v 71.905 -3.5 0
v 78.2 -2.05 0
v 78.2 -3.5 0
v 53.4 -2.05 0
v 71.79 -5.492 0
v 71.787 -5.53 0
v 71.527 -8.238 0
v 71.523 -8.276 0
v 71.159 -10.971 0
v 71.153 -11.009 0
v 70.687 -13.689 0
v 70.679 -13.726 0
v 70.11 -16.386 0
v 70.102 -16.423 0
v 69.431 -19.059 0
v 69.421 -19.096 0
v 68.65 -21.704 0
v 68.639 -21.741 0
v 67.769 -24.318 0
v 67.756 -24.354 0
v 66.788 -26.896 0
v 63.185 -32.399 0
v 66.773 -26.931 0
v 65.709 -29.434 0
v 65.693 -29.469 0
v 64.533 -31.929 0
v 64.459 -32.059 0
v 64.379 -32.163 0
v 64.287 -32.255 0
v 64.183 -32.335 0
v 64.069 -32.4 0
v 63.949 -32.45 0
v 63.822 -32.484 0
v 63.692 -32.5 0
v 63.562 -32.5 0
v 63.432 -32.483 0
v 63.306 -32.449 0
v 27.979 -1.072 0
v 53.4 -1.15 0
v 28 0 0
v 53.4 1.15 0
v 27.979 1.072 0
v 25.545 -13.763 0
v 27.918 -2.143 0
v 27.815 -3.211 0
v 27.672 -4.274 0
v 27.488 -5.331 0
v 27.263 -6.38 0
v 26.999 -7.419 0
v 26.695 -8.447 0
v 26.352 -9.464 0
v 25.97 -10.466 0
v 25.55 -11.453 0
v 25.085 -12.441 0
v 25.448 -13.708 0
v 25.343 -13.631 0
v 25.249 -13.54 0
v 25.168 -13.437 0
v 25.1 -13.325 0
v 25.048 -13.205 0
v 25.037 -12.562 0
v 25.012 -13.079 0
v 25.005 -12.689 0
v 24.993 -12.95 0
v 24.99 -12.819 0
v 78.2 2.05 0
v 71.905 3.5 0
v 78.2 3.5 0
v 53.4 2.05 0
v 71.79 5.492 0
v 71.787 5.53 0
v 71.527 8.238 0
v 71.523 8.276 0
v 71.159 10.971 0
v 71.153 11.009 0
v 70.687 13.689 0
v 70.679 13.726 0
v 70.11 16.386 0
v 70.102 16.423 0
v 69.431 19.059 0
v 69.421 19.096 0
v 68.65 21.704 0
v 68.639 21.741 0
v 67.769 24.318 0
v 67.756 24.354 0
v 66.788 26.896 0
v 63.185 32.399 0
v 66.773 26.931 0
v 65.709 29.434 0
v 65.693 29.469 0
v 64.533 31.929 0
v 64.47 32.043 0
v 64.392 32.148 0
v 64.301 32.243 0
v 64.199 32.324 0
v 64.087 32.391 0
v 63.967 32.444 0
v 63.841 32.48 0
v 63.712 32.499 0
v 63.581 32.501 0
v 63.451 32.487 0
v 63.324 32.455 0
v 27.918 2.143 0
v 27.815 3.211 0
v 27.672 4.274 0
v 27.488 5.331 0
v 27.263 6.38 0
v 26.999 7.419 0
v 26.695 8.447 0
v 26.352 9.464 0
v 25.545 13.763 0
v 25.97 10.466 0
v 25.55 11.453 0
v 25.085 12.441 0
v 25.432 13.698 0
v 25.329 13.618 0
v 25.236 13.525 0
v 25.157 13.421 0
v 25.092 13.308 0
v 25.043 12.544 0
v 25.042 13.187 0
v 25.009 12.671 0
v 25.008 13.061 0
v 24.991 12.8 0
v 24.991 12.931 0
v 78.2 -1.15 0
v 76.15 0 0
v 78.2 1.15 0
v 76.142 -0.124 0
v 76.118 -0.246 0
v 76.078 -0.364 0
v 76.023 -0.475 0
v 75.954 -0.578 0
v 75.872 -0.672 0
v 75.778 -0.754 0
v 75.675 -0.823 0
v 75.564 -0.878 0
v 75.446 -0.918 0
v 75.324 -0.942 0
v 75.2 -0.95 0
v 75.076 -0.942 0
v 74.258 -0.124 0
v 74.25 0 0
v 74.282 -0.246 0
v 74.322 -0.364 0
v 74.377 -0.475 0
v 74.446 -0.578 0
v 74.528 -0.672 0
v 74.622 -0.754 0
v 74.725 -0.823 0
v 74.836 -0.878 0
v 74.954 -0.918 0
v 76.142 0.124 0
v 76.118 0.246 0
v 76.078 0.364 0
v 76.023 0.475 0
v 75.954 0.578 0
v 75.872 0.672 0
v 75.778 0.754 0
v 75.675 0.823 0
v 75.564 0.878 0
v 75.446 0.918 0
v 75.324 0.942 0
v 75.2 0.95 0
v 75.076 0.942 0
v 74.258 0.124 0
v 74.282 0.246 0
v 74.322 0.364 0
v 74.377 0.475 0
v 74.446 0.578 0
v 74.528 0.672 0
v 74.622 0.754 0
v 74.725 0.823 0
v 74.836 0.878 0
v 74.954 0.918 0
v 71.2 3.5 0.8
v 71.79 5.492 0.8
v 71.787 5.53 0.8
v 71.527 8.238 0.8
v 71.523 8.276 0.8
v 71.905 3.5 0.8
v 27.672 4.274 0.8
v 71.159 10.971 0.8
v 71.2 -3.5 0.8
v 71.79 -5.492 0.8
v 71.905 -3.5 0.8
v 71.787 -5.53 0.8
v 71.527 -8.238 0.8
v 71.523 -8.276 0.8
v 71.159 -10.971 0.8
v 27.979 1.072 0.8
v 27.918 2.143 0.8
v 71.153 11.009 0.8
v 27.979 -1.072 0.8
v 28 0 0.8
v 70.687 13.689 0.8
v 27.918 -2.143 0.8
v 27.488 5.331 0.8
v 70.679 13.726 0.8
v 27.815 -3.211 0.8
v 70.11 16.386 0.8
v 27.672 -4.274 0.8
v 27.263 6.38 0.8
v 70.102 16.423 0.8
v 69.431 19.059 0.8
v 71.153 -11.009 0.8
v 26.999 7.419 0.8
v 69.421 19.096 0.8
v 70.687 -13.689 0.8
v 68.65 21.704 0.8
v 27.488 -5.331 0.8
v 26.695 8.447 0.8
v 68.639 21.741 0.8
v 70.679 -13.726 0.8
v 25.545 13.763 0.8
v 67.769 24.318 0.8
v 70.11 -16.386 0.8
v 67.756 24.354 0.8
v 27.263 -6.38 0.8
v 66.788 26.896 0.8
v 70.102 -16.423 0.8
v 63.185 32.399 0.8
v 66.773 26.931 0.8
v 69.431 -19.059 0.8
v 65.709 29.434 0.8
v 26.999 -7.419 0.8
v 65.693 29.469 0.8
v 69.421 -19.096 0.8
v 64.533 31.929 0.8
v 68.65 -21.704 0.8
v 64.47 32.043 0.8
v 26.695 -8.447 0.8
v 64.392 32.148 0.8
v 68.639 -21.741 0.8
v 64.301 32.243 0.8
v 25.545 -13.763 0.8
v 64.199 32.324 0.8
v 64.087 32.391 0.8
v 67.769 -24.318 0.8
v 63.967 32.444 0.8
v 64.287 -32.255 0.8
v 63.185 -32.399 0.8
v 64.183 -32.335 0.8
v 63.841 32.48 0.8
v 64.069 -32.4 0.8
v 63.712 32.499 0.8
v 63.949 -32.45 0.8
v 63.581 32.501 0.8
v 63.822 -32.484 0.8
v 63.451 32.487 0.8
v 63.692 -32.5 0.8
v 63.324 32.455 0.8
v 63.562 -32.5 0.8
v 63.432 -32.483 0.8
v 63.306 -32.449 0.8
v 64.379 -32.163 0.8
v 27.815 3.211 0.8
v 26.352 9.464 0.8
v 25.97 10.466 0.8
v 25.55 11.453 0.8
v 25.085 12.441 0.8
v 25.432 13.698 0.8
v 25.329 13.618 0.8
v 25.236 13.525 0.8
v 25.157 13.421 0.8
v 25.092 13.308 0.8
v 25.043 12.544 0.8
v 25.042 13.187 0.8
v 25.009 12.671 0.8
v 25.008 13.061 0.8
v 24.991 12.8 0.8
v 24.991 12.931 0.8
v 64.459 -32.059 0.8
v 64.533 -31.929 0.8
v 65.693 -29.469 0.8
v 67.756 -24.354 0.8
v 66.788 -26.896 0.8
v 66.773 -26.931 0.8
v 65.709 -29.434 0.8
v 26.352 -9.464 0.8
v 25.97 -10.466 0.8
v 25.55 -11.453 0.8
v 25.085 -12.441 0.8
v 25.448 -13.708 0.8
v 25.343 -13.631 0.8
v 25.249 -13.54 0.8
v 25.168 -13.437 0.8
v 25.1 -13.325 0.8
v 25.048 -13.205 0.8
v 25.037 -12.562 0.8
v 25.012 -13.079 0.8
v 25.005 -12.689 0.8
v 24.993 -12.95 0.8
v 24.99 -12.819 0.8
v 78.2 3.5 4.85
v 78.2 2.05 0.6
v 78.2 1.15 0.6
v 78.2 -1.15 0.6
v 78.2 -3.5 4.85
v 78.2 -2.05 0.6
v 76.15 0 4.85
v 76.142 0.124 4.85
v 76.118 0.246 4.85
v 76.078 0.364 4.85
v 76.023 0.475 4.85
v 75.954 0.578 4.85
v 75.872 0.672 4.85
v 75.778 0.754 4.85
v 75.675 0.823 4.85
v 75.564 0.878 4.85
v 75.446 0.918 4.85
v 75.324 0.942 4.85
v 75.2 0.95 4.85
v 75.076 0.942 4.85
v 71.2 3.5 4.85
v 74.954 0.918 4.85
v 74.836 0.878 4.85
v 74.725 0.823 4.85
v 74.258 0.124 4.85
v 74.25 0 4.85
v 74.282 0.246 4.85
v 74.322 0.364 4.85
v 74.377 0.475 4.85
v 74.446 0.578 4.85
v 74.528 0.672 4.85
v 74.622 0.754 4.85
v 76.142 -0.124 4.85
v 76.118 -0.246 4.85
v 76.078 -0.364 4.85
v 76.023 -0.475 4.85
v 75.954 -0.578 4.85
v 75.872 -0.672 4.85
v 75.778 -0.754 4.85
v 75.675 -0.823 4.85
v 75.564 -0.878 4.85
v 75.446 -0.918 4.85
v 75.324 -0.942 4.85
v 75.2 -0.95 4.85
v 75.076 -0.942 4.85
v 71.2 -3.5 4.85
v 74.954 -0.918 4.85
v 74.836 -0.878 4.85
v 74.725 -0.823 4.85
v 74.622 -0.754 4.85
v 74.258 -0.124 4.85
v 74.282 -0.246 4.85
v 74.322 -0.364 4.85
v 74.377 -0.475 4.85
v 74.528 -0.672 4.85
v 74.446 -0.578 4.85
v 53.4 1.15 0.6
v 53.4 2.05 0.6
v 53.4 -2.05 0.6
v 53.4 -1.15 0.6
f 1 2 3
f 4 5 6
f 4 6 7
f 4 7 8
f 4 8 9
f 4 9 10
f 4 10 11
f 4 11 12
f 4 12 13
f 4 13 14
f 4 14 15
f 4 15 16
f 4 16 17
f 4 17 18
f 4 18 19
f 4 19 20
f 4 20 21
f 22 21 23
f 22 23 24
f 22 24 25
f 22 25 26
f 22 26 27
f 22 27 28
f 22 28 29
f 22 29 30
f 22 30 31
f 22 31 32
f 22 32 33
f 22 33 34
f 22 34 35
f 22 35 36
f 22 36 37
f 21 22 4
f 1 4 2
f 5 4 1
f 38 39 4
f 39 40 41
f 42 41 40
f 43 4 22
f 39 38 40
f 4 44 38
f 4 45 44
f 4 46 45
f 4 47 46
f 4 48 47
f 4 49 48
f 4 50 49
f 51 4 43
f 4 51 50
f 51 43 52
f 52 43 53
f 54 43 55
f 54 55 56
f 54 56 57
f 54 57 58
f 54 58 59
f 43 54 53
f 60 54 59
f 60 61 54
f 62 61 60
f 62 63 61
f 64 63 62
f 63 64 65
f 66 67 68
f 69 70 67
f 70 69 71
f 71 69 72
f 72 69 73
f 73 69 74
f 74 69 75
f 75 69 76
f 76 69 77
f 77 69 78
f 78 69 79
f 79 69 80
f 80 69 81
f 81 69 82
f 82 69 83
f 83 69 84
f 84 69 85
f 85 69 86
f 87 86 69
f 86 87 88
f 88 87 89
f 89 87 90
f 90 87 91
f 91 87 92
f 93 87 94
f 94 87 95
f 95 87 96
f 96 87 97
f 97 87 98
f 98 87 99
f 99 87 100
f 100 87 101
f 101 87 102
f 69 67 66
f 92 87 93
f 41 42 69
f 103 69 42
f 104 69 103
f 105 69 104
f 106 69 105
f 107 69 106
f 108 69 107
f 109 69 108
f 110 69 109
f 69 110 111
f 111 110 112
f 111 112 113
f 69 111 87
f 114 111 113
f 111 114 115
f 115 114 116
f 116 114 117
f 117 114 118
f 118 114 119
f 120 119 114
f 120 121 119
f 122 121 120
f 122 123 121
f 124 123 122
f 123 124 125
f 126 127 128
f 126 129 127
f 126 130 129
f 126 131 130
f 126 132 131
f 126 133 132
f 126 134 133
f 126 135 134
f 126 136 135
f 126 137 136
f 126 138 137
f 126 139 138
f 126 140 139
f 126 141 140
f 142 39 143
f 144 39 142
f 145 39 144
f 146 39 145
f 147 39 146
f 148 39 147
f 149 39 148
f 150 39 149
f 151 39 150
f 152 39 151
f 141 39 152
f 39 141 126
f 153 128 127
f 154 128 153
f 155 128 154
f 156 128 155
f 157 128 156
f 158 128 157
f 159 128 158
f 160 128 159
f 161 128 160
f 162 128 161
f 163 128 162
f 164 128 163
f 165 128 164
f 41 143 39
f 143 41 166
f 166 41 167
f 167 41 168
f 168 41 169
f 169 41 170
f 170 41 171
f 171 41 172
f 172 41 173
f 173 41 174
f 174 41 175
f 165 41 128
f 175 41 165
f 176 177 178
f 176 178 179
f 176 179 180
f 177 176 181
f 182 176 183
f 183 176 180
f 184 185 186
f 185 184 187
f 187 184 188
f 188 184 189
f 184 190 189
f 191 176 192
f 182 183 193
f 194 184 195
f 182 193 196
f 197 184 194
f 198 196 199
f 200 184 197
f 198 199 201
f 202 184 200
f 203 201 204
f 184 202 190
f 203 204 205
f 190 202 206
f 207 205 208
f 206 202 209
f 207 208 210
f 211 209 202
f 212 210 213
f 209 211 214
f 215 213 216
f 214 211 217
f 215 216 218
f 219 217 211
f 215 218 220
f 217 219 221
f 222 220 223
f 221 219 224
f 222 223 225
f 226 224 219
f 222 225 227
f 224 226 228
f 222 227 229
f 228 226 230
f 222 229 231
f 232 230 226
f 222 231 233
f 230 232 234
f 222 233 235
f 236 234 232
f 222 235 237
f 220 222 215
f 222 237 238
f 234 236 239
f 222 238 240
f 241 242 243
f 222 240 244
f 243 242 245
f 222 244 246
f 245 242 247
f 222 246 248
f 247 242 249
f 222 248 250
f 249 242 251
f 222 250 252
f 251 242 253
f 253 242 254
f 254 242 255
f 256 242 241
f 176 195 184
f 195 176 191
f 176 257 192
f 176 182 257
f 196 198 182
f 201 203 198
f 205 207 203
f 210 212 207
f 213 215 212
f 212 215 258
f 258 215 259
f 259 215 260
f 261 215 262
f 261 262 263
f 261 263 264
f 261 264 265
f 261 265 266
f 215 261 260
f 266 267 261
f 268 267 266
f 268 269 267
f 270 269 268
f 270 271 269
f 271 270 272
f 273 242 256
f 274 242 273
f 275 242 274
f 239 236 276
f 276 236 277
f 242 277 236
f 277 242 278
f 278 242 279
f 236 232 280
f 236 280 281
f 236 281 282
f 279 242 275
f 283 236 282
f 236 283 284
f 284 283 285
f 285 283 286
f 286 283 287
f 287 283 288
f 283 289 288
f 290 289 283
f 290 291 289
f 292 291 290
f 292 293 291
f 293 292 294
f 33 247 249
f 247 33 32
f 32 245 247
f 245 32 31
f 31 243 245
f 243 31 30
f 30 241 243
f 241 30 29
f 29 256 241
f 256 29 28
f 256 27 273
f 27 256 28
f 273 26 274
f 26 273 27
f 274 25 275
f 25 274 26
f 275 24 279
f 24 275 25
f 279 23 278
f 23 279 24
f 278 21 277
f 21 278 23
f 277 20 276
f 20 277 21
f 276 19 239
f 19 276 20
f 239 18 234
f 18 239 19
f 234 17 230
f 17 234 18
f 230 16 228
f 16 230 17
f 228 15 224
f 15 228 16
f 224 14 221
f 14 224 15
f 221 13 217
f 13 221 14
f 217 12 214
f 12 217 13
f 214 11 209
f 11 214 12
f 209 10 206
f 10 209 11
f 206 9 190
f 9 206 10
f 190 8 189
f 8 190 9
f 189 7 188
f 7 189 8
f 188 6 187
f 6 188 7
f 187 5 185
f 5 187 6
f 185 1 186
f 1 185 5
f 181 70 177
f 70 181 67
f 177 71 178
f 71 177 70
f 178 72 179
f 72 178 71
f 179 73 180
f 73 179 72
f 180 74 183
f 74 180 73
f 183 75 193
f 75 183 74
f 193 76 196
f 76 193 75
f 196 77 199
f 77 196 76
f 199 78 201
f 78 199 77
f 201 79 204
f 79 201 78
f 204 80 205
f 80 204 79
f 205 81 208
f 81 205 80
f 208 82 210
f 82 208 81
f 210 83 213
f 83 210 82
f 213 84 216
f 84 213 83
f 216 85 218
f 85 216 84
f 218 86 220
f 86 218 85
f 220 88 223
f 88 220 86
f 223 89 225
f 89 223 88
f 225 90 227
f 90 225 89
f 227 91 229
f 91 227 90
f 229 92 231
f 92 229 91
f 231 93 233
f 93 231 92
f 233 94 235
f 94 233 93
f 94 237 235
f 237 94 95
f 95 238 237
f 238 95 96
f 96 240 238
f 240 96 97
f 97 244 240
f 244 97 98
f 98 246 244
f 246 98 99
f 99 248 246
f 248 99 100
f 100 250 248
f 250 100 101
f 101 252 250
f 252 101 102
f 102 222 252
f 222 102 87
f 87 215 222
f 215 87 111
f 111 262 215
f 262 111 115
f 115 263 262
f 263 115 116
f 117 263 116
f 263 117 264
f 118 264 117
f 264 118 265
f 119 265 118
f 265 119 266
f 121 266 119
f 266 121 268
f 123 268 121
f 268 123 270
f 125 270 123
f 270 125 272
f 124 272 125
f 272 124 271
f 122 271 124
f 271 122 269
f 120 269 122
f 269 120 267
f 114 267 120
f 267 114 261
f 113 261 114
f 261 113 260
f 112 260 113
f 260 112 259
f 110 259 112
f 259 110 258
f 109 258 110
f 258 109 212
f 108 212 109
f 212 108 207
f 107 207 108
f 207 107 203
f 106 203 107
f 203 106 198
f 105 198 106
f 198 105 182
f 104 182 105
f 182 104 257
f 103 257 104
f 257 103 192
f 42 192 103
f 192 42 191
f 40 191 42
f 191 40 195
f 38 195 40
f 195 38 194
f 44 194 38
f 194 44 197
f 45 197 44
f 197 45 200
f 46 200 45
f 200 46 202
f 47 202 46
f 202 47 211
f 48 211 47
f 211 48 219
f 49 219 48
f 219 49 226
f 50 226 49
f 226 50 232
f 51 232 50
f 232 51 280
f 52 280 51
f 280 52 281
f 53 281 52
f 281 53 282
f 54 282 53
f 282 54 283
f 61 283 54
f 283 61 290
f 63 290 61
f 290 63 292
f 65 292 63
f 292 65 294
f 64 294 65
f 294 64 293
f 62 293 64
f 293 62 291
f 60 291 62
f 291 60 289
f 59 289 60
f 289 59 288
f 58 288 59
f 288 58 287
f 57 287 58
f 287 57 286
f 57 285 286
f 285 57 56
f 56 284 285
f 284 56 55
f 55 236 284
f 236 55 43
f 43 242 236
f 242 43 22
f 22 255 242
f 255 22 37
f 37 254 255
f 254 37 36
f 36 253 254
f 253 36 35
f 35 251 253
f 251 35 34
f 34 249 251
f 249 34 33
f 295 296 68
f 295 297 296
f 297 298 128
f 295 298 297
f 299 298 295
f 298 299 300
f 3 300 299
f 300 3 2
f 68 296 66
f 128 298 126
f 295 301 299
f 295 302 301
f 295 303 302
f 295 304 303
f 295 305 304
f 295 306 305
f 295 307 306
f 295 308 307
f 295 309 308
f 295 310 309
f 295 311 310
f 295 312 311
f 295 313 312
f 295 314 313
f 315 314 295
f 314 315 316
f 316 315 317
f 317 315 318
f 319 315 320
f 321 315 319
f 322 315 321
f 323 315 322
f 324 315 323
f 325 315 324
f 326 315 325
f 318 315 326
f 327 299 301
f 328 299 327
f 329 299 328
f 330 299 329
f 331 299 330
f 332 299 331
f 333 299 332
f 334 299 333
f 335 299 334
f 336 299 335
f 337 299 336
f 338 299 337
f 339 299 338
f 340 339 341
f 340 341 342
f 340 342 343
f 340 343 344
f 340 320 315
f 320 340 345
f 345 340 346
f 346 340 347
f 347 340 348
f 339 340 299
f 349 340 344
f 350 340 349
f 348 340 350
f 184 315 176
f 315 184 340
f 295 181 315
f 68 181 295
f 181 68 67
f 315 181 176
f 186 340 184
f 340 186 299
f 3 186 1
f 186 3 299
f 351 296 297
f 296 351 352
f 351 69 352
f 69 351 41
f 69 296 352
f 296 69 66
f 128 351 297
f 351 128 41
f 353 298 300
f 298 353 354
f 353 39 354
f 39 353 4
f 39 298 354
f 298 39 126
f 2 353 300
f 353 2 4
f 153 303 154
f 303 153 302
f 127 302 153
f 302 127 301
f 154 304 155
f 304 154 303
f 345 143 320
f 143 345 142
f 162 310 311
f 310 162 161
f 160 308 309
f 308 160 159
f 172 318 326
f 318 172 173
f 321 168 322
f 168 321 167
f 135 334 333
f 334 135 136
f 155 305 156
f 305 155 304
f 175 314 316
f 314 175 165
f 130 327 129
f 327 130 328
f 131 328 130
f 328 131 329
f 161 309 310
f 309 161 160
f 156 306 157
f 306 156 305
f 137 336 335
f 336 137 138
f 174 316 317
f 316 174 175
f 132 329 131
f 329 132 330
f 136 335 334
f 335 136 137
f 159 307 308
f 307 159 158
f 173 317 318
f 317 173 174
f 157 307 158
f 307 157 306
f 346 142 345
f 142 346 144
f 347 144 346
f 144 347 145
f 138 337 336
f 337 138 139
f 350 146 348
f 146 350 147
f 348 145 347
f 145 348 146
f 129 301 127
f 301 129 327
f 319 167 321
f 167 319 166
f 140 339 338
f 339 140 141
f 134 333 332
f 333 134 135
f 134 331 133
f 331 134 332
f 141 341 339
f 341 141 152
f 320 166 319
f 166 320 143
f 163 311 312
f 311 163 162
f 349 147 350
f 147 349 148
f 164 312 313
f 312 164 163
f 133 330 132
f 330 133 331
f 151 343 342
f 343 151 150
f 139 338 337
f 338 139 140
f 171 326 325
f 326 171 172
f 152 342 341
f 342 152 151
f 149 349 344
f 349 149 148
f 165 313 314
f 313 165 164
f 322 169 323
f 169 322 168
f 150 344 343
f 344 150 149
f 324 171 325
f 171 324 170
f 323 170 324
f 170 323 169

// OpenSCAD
// file: parameters.scad
// =============================================================================
// Gen-BL — nightly 2026-10-06 (physics_scorer, honest magpylib watts)
// Dense-wind, smaller gap: the wire budget (not the window) limits these machines, so the same ~367 m of 26 AWG is laid layer-by-layer at fill 0.65 into a SHORTER 8.1 mm window (vs 9.0 mm on Gen-BI) with a 17.1 mm build on 29–71 mm sector bobbins. That shrinks the magnet-to-magnet gap 11.6 → 10.7 mm, so every turn sees more flux. Rotors, Ø5 tight-assist map and Ø134 × 4.76 mm steel are identical to Gen-BI (modular: only bobbins, stator and gap sleeve change).
// Clocking 0 deg (magnets N facing S) + D-flat keyed bore + index notch + flip-symmetric hole map.
// Windable 2-piece bobbin; turns = physics_scorer turns_fit; copper only between flanges.
// Steel back-iron: 2× Ø134 × 4.76 mm (3/16") mild-steel discs (steel_backiron_disc.dxf); magnets sit ON the steel
// (through-pockets) -> score with --back-iron.
// =============================================================================
topology            = "dual_rotor";

// --- Wire / winding (physics_scorer winding-fit) -------------------------------
wire_awg            = 26;
wire_od             = 0.45;     // insulated OD mm (bare 0.405)
fill_realistic      = 0.65;     // insulated-wire area / window (DENSE layered wind with a jig; scorer cap 0.65)
turns               = 566;       // = physics_scorer turns_fit (do NOT raise)
coil_former_type    = "bobbin";
coil_core_inset     = 17.10;     // radial copper build: hub = copper boundary inset by this
wind_build_axial    = 0.0;      // nothing proud of the flanges
wind_build_radial   = 0.0;

// --- Bobbin (base + lid) ---------------------------------------------------------
coil_id_r           = 29.00;    // copper boundary sector
coil_od_r           = 71.00;
span_deg            = 52.68;    // = pitch - 2*asin((wall+0.85)/coil_id_r) -> >=1.2 mm stator web
former_web          = 8.10;     // copper height between flanges (TALL copper: steel keeps Bz up)
flange_t            = 0.80;     // >= 0.8 mm FDM wall rule (tall winds push on the flanges)
wall                = 1.00;     // flange lip beyond copper
former_bare_h       = former_web + 2 * flange_t;
coil_envelope_h     = former_bare_h + 2 * wind_build_axial;
tab_w               = 7.0;
tab_len             = 7.0;
tab_h               = former_bare_h / 2;
pin_d               = 1.9;      // 1.75 mm filament locating pin
coil_mount_r        = coil_od_r + 0.2 + 4.0;
lead_y              = 1.6;
lead_slot_w         = 0.9;
lead_groove_d       = 0.6;

// --- Gap -------------------------------------------------------------------------
run_clear           = 0.50;     // rotor face -> flange
gap_spacer_h        = run_clear + wind_build_axial;
m2m                 = coil_envelope_h + 2 * run_clear;   // rotor face to rotor face (= gap_sleeve length)

// --- Stator ----------------------------------------------------------------------
coil_stations       = 6;
bay_clear           = 0.25;
stator_thick        = former_bare_h;                        // bobbins flush both faces
stator_od           = 160;
shaft_clear_stator  = 14.0;     // stator is static; gap sleeve OD 12 spins inside

// --- Rotor(s) --------------------------------------------------------------------
magnet_Br           = 1.43;     // N52
magnet_d_large      = 20.0;
magnet_h_large      = 5.0;      // one O20x5 per pocket
magnet_h_small      = 5.0;      // one O5x5 per pocket
halbach_magnetisation = "diametric"; // O5x5 assist magnets MUST be DIAMETRICALLY magnetised (tangential)
rotor_b_same_axis   = true;     // same-index magnets share one axis: N faces S across the gap
large_pocket_d      = 20.3;
small_pocket_d      = 5.3;
pocket_h            = 5.10;     // THROUGH the carrier: magnet back face sits on the steel disc
large_n             = 8;
R_large             = 50.0;
R_small_inner       = 40.0;
R_small_mid         = 50.0;
R_small_outer       = 60.0;
small_r_list        = [R_small_inner, R_small_mid, R_small_outer];   // O5 pockets between poles
carrier_od          = 134.0;
carrier_thick       = pocket_h;
hub_h               = 12.0;     // > steel_t + insert: radial set-screw clears the steel
hub_od              = 24.0;     // slim hub so the M4 brace rods fit at R~18 inside the coil ring
hub_insert_d        = 4.0;      // M3 heat-set insert, radial, bears on the D-flat
rotor_b_offset_deg  = 0.0;      // CLOCKING: magnets directly opposite
shaft_key           = "dflat";
dflat_depth         = 0.5;      // 8 mm shaft with 0.5 mm flat (7.5 across flat)
index_notch_d       = 3.0;

// --- Steel back-iron (buyable laser-cut) -------------------------------------------
steel_t             = 4.76;      // mild steel thickness (image method ignores it; sized from steel_flux.py so the return path stays well below saturation)
steel_center_hole   = 26.0;     // slips over the rotor hub (OD 24)
steel_od            = carrier_od;   // steel disc OD = rotor carrier OD

// --- Modular MAX interface ----------------------------------------------------------
shaft_bore          = 8.35;
dflat_x             = 4.0 - dflat_depth + (shaft_bore - 8.0) / 2;
bearing_d           = 21.85;
bearing_h           = 7.2;
m3_clear            = 3.5;
bolt_r_inner        = 30.0;     // M3 steel-disc clamp bolts (inside the magnet ring)
bolt_n_inner        = 4;
bolt_inner_angles   = [0, 90, 180, 270];
bolt_r_outer        = 63.0;     // M3 steel-disc clamp bolts (outside the magnet ring)
bolt_outer_angles   = [45, 135, 225, 315];
flange_bolt_r       = 73.0;     // frame rods: OUTSIDE the rotor OD (rotors spin inside them)
flange_bolt_n       = 6;
flange_bolt_offset  = 30.00;    // between coil stations -> never cuts a lead groove/tab
brace_r             = 18.0;
brace_d             = 4.3;      // temporary M4 jack rods (assembly only)
brace_n             = 4;
brace_angles        = [45, 135, 225, 315];          // flip-symmetric

spacer_pad_od       = 14.0;
spacer_pad_id       = m3_clear;
endbell_od          = 160;
endbell_thick       = 8.0;
endbell_shaft_clear = 10.0;
collar_h            = 10.0;
standoff_od         = 9.0;
frame_standoff_h    = run_clear + carrier_thick + hub_h + collar_h + 2.0;
sleeve_od           = 12.0;
plate_max_mm        = 410;

$fn = 64;
// main file
// Gen-BL — bobbin LID (top flange + locating tab). Print x6, flange face DOWN on the bed.
// CA-glue onto the hub top BEFORE winding. Tab = lap joint into the stator tab pocket; 1.75 mm filament
// pin through pin hole + stator ledge, trim flush. Lead slots carry both leads flush.
include <parameters.scad>;
$fn = 48;
module sector_2d(r_in, r_out, ang) {
    polygon([
        for (a = [-ang/2 : ang/24 : ang/2]) [r_in*cos(a), r_in*sin(a)],
        for (a = [ang/2 : -ang/24 : -ang/2]) [r_out*cos(a), r_out*sin(a)]
    ]);
}
module footprint_2d() { offset(r=wall) sector_2d(coil_id_r, coil_od_r, span_deg); }
module hub_2d()       { offset(delta=-coil_core_inset) sector_2d(coil_id_r, coil_od_r, span_deg); }

difference() {
    union() {
        linear_extrude(flange_t) footprint_2d();
        translate([coil_od_r + 0.2, -tab_w/2, 0]) cube([tab_len, tab_w, tab_h]);
    }
    translate([coil_mount_r, 0, -0.1]) cylinder(d=pin_d, h=tab_h + 1);
    for (y = [lead_y, -lead_y])
        translate([coil_od_r - coil_core_inset - 0.5, y - lead_slot_w/2, -0.1])
            cube([coil_core_inset + tab_len + 2, lead_slot_w, lead_groove_d + 0.1]);
}
